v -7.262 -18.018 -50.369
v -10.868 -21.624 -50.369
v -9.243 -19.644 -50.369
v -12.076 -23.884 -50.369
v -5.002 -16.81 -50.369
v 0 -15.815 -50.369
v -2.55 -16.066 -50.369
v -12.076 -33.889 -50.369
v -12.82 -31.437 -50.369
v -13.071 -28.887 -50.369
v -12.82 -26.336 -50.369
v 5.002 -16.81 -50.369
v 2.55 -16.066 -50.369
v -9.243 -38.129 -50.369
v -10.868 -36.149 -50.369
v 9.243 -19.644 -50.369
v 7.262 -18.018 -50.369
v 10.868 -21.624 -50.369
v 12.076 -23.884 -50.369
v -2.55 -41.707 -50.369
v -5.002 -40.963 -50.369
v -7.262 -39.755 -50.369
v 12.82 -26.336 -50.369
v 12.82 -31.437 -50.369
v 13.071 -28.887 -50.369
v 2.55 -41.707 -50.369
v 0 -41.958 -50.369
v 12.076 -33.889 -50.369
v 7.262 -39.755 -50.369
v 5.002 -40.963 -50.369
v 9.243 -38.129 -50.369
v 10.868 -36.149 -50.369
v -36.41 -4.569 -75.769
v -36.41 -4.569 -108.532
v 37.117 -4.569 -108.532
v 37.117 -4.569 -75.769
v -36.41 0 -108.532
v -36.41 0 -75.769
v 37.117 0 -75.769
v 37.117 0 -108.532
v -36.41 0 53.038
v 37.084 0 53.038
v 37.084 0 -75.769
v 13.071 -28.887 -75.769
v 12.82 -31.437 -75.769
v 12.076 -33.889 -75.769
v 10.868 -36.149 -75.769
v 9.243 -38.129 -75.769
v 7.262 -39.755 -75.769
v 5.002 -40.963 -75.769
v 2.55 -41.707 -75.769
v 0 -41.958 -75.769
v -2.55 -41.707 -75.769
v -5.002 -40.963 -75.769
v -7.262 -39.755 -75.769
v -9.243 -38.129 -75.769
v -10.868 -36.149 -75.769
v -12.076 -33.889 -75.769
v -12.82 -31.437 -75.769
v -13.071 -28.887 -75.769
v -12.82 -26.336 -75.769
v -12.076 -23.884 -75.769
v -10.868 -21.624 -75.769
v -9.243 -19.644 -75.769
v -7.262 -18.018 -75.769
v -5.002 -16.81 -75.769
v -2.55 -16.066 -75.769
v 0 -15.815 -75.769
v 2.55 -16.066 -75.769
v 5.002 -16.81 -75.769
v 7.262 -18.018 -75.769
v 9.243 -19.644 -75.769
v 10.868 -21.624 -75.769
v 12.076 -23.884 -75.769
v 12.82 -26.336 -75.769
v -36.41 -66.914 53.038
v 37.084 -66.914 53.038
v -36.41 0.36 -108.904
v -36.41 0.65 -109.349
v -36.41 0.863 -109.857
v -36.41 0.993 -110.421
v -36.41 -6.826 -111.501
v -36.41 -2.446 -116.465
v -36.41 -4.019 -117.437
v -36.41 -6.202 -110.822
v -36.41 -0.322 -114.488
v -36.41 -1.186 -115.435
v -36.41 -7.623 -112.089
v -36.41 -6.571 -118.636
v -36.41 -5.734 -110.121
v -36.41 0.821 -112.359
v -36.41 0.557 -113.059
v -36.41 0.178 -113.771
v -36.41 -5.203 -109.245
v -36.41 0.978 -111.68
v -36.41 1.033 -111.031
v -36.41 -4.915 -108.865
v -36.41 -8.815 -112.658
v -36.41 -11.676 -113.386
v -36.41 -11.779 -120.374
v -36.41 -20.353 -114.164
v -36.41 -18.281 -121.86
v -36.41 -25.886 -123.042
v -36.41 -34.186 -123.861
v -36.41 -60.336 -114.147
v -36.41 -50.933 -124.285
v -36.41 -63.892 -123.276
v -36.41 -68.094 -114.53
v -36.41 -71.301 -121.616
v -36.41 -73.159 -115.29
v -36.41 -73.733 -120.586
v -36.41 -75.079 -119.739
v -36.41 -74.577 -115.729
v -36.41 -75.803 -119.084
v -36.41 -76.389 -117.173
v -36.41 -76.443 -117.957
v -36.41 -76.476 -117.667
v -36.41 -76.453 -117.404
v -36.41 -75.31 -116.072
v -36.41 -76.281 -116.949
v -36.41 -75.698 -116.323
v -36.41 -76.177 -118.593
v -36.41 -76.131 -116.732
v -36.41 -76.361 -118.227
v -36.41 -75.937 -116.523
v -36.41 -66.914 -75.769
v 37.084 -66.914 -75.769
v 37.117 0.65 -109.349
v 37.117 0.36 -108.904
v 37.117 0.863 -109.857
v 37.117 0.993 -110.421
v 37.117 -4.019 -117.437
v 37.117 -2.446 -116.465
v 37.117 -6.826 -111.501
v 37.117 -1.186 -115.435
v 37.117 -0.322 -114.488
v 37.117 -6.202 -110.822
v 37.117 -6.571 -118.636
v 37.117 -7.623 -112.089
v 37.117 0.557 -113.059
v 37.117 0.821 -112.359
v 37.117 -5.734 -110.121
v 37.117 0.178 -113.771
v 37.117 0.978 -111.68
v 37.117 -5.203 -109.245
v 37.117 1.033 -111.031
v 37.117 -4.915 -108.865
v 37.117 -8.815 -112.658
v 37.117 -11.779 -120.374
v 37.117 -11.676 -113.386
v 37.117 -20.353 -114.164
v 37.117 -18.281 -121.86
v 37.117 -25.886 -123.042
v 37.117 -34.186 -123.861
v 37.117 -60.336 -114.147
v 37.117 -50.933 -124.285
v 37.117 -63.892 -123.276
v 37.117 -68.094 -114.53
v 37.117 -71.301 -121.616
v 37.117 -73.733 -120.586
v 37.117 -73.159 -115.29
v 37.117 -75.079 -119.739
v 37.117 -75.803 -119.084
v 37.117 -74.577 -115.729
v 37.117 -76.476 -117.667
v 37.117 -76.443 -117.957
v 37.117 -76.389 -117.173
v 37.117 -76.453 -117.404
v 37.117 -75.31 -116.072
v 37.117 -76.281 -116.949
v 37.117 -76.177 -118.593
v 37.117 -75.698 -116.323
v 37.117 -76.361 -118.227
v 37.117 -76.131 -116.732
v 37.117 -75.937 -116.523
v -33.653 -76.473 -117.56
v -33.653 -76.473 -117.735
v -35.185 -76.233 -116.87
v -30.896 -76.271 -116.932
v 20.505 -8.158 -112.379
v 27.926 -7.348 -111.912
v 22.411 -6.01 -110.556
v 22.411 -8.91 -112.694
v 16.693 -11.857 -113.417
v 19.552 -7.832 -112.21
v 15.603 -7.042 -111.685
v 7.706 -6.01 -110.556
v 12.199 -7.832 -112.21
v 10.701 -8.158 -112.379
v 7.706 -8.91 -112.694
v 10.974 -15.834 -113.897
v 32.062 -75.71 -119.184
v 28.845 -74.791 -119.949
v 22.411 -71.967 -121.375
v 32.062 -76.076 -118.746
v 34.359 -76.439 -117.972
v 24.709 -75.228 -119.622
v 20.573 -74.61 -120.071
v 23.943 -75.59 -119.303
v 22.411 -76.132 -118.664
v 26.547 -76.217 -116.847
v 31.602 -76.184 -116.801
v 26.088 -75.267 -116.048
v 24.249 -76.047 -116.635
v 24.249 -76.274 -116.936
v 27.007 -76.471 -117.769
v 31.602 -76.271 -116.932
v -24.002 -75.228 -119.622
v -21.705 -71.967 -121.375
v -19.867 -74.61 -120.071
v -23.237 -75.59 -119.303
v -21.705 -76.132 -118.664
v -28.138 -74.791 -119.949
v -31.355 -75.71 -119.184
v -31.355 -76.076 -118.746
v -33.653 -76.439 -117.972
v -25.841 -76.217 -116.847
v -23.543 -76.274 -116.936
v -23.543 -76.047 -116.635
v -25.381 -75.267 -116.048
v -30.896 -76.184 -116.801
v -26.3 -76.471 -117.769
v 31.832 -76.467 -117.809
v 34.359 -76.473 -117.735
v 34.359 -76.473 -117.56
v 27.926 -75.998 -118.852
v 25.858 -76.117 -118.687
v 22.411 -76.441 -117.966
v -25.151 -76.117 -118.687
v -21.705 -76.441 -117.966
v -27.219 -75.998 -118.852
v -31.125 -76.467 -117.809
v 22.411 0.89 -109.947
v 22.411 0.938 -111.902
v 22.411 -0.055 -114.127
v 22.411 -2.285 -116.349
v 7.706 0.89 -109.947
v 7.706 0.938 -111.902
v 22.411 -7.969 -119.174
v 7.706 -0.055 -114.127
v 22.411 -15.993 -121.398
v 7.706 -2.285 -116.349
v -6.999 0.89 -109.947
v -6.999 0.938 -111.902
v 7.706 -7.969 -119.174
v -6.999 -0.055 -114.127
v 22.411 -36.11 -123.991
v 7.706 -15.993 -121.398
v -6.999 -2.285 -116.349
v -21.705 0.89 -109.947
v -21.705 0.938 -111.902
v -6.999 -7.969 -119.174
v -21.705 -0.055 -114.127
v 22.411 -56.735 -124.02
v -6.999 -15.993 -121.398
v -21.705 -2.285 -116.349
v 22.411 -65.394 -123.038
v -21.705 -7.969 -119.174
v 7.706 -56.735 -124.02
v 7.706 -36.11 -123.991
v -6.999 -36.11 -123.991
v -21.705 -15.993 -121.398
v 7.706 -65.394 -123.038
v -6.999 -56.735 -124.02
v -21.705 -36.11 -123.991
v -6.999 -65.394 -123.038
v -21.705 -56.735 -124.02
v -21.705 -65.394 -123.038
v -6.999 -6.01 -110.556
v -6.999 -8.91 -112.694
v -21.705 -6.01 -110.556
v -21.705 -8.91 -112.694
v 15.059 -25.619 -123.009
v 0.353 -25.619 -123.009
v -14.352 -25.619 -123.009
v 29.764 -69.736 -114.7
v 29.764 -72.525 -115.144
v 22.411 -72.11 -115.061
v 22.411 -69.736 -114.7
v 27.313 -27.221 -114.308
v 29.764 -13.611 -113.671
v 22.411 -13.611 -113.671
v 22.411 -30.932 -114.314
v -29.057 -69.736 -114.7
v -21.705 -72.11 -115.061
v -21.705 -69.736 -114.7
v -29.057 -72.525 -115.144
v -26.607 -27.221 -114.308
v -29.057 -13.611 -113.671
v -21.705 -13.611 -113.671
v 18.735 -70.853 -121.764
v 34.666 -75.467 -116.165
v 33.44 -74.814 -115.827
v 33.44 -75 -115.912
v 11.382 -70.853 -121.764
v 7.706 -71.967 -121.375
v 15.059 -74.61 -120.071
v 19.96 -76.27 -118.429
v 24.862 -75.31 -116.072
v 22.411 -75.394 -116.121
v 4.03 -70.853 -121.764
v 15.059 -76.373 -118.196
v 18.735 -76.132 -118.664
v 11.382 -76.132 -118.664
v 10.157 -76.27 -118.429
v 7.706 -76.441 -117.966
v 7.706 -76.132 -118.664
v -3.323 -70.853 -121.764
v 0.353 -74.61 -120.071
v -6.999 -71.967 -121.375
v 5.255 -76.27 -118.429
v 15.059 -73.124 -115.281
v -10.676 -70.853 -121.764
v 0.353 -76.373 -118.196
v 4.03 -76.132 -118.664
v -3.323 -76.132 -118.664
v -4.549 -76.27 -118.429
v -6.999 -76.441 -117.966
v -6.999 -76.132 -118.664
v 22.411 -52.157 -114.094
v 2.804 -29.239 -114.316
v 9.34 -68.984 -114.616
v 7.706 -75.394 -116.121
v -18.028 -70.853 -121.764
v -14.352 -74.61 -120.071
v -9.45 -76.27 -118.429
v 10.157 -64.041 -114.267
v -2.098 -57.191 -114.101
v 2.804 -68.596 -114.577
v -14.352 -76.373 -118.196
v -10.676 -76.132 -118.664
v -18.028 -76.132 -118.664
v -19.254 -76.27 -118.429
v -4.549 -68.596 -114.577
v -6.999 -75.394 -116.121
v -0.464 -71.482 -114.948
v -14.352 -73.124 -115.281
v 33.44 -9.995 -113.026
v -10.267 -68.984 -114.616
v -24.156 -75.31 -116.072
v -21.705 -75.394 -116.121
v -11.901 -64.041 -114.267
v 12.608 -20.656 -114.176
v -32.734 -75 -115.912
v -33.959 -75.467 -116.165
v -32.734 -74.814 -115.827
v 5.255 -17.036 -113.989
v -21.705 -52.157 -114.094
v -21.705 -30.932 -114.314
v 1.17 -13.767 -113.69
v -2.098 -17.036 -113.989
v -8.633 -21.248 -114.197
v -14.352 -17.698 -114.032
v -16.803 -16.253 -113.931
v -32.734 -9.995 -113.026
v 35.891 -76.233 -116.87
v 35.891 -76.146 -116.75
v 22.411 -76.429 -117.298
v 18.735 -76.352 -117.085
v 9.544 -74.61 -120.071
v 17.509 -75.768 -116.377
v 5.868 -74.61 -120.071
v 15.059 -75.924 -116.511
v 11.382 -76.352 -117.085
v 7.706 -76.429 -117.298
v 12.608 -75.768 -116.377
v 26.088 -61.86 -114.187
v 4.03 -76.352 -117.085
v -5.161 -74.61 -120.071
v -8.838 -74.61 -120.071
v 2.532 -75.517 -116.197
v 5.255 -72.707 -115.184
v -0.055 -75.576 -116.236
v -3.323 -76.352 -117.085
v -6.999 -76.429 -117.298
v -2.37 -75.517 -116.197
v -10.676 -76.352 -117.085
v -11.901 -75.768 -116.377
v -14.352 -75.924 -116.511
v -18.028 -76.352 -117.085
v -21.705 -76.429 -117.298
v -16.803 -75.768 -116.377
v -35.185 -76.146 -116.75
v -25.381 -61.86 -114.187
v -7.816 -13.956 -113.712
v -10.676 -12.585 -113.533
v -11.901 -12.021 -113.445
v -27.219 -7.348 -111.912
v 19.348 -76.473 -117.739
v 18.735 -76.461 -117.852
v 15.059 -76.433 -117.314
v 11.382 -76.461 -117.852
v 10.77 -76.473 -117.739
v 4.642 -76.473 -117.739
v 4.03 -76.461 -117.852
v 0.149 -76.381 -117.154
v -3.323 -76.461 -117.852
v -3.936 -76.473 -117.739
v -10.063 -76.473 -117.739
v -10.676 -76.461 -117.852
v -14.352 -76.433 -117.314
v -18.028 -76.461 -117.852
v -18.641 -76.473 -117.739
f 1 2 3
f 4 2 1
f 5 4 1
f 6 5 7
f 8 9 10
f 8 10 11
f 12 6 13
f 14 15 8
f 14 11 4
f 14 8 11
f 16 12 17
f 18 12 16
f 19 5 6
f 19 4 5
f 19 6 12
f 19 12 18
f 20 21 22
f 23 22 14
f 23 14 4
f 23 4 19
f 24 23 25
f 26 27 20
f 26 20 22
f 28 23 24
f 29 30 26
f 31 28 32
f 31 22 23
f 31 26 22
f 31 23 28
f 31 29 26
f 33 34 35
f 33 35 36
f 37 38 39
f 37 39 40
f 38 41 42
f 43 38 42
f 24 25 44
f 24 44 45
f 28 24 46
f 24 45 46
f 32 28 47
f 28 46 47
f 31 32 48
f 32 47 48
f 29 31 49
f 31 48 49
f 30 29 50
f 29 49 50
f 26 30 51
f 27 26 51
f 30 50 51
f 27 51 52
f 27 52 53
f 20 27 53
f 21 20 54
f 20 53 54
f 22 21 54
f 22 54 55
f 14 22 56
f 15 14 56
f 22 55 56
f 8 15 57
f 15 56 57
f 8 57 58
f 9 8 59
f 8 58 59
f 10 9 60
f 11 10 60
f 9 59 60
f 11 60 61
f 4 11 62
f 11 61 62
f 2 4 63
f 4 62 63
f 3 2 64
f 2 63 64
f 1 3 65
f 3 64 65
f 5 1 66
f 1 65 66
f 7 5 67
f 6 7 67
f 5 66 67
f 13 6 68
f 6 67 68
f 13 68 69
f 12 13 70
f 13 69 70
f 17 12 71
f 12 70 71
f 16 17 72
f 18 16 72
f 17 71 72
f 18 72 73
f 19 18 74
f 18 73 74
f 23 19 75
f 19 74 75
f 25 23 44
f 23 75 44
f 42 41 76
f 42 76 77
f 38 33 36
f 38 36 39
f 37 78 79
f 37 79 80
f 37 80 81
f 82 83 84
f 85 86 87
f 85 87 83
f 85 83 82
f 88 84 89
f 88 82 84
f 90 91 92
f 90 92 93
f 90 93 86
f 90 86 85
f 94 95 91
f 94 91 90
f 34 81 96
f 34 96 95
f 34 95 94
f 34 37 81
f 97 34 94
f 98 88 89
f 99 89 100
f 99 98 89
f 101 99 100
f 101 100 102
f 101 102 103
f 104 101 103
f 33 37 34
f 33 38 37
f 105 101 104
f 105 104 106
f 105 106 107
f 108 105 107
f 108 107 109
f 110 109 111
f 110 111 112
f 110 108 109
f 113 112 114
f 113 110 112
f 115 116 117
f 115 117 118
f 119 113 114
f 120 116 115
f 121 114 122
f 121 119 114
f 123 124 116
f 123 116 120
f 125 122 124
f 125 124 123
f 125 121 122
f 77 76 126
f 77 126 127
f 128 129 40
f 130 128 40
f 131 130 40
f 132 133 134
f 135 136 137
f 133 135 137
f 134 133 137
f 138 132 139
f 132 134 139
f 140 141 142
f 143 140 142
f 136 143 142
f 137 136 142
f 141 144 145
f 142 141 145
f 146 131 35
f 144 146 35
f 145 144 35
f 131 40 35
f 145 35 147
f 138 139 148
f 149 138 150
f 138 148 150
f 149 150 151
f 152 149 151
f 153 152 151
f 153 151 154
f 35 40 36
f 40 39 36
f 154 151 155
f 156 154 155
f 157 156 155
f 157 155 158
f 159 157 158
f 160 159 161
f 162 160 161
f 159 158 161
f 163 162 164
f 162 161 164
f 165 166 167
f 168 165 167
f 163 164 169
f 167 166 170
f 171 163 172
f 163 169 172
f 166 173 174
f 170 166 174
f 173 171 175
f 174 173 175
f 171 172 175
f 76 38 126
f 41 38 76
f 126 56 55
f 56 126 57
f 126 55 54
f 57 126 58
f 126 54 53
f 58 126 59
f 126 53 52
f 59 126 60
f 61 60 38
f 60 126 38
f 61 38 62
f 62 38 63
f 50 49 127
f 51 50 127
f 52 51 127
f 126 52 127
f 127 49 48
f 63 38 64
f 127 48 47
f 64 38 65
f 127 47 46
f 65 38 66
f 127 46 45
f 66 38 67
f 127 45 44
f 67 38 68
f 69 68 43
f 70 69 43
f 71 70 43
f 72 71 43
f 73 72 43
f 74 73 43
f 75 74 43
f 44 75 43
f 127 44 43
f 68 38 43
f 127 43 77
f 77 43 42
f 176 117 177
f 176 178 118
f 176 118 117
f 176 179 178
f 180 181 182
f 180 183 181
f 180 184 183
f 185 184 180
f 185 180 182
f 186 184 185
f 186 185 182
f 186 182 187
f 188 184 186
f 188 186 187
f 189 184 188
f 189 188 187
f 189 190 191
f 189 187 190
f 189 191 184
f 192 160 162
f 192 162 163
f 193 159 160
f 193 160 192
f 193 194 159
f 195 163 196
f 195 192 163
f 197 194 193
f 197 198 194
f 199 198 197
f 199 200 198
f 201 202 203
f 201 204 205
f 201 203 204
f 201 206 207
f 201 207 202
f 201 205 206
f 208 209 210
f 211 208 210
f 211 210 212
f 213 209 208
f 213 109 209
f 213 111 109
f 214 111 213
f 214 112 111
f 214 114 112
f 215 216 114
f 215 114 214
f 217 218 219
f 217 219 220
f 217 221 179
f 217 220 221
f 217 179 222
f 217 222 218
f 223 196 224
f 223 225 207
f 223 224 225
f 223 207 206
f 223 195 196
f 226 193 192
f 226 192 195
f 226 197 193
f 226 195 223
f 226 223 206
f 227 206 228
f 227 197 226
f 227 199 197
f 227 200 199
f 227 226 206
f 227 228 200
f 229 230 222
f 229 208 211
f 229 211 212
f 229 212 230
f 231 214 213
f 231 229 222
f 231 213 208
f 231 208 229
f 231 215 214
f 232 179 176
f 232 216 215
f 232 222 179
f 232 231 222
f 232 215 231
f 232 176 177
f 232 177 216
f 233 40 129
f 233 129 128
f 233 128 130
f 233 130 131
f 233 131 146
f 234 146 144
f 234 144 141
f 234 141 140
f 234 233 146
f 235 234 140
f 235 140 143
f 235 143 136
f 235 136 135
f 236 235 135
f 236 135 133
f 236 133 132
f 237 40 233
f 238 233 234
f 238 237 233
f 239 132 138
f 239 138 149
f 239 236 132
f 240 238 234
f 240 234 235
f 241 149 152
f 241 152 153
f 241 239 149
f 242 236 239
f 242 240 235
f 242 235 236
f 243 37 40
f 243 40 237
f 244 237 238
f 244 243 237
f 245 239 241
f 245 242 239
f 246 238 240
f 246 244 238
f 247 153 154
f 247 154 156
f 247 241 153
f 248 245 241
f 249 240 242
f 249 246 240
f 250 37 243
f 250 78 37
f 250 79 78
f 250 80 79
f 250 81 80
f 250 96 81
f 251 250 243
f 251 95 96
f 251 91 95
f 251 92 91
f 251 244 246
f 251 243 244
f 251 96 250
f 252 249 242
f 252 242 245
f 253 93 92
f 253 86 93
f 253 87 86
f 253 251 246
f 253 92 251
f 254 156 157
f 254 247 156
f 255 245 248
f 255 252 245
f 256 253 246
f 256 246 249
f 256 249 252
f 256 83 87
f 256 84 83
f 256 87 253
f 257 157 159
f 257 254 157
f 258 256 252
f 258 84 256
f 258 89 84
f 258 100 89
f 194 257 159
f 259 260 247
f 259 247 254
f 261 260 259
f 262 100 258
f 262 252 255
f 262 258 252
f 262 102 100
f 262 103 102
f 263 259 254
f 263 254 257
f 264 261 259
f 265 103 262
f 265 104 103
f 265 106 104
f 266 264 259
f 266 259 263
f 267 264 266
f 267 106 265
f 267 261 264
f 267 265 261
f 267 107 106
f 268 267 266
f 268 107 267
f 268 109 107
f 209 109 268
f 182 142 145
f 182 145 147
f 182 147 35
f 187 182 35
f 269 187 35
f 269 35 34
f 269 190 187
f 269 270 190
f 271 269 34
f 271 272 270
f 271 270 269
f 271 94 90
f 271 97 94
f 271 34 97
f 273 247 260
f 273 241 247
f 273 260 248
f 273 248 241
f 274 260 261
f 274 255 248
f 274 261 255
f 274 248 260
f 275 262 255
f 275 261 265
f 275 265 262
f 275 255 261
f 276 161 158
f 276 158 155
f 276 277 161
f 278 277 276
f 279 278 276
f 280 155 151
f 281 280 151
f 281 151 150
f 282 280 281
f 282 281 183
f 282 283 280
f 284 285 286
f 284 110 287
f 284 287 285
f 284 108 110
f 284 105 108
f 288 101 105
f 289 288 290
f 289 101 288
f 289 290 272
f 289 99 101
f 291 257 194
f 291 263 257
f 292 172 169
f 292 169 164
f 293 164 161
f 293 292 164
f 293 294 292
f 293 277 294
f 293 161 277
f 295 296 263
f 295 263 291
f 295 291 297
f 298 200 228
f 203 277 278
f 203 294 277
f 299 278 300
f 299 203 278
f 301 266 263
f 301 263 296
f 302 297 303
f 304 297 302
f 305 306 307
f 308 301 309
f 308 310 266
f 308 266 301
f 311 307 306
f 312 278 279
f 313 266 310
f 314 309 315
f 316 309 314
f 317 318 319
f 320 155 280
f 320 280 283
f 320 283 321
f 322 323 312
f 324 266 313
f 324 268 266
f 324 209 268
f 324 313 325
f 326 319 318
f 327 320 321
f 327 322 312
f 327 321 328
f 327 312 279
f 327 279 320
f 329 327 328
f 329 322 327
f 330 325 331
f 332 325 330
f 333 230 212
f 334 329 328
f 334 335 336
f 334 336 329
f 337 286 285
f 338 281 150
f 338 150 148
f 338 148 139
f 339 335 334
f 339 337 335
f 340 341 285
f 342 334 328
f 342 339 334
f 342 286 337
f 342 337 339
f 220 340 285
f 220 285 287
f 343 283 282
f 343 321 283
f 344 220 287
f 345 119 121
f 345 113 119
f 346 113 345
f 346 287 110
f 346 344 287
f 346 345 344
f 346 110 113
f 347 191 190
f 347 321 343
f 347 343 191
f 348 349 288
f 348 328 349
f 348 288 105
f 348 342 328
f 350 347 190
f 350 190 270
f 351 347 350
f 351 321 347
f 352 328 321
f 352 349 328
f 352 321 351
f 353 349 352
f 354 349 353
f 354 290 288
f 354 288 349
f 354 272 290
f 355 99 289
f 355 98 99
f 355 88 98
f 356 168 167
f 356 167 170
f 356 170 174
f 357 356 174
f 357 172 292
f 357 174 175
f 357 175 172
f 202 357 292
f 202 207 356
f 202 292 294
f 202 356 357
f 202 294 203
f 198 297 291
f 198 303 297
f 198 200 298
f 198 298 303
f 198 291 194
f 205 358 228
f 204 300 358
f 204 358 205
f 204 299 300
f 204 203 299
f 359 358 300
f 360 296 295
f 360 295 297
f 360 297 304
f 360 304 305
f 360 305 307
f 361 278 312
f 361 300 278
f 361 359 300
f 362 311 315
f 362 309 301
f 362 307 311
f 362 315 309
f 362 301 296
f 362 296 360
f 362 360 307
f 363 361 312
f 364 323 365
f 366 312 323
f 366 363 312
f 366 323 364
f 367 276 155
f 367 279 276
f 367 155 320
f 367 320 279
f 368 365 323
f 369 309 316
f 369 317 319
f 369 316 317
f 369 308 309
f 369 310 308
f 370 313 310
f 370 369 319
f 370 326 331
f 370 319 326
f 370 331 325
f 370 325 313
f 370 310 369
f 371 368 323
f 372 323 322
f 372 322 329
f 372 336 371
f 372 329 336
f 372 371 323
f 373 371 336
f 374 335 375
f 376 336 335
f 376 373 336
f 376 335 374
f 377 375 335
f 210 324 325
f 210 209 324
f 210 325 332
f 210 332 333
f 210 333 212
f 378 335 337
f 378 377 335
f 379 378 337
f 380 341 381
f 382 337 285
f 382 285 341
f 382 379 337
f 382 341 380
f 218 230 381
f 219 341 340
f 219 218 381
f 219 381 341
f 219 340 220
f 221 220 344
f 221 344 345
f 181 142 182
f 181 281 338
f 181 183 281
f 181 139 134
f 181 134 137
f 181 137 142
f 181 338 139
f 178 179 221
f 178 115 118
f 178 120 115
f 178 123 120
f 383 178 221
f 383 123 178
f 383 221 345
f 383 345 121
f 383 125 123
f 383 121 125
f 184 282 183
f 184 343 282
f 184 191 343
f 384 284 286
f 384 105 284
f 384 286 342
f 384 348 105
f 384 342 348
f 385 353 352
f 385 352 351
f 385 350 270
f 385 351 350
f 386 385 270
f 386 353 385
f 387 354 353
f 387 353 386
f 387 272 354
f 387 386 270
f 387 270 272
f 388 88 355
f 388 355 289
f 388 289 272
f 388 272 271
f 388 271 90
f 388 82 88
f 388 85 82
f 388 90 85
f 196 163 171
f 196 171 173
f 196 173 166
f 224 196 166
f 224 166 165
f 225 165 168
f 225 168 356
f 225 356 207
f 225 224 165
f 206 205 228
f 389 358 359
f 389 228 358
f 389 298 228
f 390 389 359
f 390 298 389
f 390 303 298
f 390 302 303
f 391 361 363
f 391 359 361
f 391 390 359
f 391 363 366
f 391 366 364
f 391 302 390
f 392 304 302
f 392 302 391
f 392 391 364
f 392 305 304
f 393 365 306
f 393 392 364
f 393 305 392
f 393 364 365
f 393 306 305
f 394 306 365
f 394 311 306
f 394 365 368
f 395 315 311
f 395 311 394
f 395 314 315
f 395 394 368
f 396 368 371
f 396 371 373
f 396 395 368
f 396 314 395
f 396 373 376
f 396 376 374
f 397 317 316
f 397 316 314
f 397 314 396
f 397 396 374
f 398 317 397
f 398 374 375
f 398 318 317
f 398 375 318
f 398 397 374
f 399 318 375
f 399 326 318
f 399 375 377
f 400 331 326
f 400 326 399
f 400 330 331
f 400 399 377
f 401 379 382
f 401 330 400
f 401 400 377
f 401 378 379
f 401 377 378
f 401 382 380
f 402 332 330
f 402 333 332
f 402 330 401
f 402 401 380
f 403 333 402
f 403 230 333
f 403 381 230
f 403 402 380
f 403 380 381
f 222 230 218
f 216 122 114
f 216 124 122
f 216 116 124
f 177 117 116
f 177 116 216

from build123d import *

# Parameters (mm, degrees)
F0_W     = 73.4944455326
F0_H     = 128.8070529699
F1_DEPTH = 66.91422
F3_DEPTH = 73.52671
F4_R     = 13.0714114786
F5_DEPTH = 25.4


with BuildPart() as f1:
    # F0 (on Front) → F1 (new body)
    with BuildSketch(Plane.XZ):
        with Locations((0.3371294588, -11.3651156425)):
            Rectangle(F0_W, F0_H)
    extrude(amount=F1_DEPTH)

    # F4 (on face) → F5 (cut)
    with BuildSketch(Plane(origin=(0, 0, -75.7686421275), x_dir=(1, 0, 0), z_dir=(0, 0, -1))):
        with Locations((0, 28.8865305483)):
            Circle(F4_R)
    extrude(amount=-F5_DEPTH, mode=Mode.SUBTRACT)


with BuildPart() as f3:
    # F2 (on face) → F3 (new body)
    with BuildSketch(Plane(origin=(-36.4100933075, 0, 0), x_dir=(0, -1, 0), z_dir=(-1, 0, 0))):
        with BuildLine():
            Line((4.5693493448, -75.7686421275), (0, -75.7686421275))
            Line((0, -75.7686421275), (0, -108.5322573781))
            add(Edge.make_bspline(
                [(4.5693493448, -108.5322573781), (3.4544405111, -107.6442845671), (1.2443930447, -107.4803571585), (0, -108.5322573781)],
                knots=[0.9192317518, 0.9192317518, 0.9192317518, 0.9192317518, 1, 1, 1, 1], degree=3))
            Line((4.5693493448, -108.5322573781), (4.5693493448, -75.7686421275))
        make_face()
        with BuildLine():
            add(Edge.make_bspline(
                [(4.5693493448, -108.5322573781), (3.4544405111, -107.6442845671), (1.2443930447, -107.4803571585), (0, -108.5322573781)],
                knots=[0.9192317518, 0.9192317518, 0.9192317518, 0.9192317518, 1, 1, 1, 1], degree=3))
            add(Edge.make_bspline(
                [(0, -108.5322573781), (-1.6612931093, -109.9365681736), (-1.4264246437, -123.9678277985), (71.1222384867, -127.3478206349), (82.6559450921, -110.1035008934), (5.1463672701, -118.0822262935), (5.8483480225, -109.5509200855), (4.5693493448, -108.5322573781)],
                knots=[0, 0, 0, 0, 0.1078274543, 0.4236470104, 0.5182856205, 0.8265762096, 0.9192317518, 0.9192317518, 0.9192317518, 0.9192317518], degree=3))
        make_face()
    extrude(amount=-F3_DEPTH)


solid = Compound([f1.part, f3.part])
